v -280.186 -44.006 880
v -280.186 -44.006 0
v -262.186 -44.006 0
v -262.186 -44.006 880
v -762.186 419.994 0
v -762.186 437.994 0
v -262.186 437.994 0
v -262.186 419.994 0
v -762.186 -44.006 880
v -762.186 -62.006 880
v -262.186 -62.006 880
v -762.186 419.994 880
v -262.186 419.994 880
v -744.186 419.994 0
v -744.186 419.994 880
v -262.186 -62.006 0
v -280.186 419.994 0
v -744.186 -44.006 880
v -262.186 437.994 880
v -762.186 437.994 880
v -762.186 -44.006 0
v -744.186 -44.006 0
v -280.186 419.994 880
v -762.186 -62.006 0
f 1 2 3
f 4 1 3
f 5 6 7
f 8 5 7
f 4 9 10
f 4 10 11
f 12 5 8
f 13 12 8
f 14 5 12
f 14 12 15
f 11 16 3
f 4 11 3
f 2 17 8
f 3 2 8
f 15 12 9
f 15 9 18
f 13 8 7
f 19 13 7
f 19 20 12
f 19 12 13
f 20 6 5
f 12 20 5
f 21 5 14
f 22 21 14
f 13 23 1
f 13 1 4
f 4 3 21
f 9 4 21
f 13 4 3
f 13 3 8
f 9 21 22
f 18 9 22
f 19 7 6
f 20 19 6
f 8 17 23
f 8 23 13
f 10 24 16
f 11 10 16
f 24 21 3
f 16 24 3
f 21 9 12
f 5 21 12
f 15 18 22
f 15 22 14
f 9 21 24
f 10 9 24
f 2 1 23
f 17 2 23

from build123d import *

# Parameters (mm, degrees)
F1_DEPTH = 880
F0_W     = 18
F0_H     = 464
F2_DEPTH = 880


with BuildPart() as f1:
    # F0 (on Top) → F1 (new body)
    with BuildSketch(Plane.XY):
        Polygon((-262.186378, 437.99419), (-762.186378, 437.99419), (-762.186378, 419.99419), (-744.186378, 419.99419), (-280.186378, 419.99419), (-262.186378, 419.99419), align=None)
        Polygon((-744.186378, -44.00581), (-762.186378, -44.00581), (-762.186378, -62.00581), (-262.186378, -62.00581), (-262.186378, -44.00581), (-280.186378, -44.00581), align=None)
    extrude(amount=F1_DEPTH)


with BuildPart() as f2:
    # F0 (on Top) → F2 (new body)
    with BuildSketch(Plane.XY):
        with Locations((-753.186378, 187.99419)):
            Rectangle(F0_W, F0_H)
        with Locations((-271.186378, 187.99419)):
            Rectangle(F0_W, F0_H)
    extrude(amount=F2_DEPTH)


solid = Compound([f1.part, f2.part])
